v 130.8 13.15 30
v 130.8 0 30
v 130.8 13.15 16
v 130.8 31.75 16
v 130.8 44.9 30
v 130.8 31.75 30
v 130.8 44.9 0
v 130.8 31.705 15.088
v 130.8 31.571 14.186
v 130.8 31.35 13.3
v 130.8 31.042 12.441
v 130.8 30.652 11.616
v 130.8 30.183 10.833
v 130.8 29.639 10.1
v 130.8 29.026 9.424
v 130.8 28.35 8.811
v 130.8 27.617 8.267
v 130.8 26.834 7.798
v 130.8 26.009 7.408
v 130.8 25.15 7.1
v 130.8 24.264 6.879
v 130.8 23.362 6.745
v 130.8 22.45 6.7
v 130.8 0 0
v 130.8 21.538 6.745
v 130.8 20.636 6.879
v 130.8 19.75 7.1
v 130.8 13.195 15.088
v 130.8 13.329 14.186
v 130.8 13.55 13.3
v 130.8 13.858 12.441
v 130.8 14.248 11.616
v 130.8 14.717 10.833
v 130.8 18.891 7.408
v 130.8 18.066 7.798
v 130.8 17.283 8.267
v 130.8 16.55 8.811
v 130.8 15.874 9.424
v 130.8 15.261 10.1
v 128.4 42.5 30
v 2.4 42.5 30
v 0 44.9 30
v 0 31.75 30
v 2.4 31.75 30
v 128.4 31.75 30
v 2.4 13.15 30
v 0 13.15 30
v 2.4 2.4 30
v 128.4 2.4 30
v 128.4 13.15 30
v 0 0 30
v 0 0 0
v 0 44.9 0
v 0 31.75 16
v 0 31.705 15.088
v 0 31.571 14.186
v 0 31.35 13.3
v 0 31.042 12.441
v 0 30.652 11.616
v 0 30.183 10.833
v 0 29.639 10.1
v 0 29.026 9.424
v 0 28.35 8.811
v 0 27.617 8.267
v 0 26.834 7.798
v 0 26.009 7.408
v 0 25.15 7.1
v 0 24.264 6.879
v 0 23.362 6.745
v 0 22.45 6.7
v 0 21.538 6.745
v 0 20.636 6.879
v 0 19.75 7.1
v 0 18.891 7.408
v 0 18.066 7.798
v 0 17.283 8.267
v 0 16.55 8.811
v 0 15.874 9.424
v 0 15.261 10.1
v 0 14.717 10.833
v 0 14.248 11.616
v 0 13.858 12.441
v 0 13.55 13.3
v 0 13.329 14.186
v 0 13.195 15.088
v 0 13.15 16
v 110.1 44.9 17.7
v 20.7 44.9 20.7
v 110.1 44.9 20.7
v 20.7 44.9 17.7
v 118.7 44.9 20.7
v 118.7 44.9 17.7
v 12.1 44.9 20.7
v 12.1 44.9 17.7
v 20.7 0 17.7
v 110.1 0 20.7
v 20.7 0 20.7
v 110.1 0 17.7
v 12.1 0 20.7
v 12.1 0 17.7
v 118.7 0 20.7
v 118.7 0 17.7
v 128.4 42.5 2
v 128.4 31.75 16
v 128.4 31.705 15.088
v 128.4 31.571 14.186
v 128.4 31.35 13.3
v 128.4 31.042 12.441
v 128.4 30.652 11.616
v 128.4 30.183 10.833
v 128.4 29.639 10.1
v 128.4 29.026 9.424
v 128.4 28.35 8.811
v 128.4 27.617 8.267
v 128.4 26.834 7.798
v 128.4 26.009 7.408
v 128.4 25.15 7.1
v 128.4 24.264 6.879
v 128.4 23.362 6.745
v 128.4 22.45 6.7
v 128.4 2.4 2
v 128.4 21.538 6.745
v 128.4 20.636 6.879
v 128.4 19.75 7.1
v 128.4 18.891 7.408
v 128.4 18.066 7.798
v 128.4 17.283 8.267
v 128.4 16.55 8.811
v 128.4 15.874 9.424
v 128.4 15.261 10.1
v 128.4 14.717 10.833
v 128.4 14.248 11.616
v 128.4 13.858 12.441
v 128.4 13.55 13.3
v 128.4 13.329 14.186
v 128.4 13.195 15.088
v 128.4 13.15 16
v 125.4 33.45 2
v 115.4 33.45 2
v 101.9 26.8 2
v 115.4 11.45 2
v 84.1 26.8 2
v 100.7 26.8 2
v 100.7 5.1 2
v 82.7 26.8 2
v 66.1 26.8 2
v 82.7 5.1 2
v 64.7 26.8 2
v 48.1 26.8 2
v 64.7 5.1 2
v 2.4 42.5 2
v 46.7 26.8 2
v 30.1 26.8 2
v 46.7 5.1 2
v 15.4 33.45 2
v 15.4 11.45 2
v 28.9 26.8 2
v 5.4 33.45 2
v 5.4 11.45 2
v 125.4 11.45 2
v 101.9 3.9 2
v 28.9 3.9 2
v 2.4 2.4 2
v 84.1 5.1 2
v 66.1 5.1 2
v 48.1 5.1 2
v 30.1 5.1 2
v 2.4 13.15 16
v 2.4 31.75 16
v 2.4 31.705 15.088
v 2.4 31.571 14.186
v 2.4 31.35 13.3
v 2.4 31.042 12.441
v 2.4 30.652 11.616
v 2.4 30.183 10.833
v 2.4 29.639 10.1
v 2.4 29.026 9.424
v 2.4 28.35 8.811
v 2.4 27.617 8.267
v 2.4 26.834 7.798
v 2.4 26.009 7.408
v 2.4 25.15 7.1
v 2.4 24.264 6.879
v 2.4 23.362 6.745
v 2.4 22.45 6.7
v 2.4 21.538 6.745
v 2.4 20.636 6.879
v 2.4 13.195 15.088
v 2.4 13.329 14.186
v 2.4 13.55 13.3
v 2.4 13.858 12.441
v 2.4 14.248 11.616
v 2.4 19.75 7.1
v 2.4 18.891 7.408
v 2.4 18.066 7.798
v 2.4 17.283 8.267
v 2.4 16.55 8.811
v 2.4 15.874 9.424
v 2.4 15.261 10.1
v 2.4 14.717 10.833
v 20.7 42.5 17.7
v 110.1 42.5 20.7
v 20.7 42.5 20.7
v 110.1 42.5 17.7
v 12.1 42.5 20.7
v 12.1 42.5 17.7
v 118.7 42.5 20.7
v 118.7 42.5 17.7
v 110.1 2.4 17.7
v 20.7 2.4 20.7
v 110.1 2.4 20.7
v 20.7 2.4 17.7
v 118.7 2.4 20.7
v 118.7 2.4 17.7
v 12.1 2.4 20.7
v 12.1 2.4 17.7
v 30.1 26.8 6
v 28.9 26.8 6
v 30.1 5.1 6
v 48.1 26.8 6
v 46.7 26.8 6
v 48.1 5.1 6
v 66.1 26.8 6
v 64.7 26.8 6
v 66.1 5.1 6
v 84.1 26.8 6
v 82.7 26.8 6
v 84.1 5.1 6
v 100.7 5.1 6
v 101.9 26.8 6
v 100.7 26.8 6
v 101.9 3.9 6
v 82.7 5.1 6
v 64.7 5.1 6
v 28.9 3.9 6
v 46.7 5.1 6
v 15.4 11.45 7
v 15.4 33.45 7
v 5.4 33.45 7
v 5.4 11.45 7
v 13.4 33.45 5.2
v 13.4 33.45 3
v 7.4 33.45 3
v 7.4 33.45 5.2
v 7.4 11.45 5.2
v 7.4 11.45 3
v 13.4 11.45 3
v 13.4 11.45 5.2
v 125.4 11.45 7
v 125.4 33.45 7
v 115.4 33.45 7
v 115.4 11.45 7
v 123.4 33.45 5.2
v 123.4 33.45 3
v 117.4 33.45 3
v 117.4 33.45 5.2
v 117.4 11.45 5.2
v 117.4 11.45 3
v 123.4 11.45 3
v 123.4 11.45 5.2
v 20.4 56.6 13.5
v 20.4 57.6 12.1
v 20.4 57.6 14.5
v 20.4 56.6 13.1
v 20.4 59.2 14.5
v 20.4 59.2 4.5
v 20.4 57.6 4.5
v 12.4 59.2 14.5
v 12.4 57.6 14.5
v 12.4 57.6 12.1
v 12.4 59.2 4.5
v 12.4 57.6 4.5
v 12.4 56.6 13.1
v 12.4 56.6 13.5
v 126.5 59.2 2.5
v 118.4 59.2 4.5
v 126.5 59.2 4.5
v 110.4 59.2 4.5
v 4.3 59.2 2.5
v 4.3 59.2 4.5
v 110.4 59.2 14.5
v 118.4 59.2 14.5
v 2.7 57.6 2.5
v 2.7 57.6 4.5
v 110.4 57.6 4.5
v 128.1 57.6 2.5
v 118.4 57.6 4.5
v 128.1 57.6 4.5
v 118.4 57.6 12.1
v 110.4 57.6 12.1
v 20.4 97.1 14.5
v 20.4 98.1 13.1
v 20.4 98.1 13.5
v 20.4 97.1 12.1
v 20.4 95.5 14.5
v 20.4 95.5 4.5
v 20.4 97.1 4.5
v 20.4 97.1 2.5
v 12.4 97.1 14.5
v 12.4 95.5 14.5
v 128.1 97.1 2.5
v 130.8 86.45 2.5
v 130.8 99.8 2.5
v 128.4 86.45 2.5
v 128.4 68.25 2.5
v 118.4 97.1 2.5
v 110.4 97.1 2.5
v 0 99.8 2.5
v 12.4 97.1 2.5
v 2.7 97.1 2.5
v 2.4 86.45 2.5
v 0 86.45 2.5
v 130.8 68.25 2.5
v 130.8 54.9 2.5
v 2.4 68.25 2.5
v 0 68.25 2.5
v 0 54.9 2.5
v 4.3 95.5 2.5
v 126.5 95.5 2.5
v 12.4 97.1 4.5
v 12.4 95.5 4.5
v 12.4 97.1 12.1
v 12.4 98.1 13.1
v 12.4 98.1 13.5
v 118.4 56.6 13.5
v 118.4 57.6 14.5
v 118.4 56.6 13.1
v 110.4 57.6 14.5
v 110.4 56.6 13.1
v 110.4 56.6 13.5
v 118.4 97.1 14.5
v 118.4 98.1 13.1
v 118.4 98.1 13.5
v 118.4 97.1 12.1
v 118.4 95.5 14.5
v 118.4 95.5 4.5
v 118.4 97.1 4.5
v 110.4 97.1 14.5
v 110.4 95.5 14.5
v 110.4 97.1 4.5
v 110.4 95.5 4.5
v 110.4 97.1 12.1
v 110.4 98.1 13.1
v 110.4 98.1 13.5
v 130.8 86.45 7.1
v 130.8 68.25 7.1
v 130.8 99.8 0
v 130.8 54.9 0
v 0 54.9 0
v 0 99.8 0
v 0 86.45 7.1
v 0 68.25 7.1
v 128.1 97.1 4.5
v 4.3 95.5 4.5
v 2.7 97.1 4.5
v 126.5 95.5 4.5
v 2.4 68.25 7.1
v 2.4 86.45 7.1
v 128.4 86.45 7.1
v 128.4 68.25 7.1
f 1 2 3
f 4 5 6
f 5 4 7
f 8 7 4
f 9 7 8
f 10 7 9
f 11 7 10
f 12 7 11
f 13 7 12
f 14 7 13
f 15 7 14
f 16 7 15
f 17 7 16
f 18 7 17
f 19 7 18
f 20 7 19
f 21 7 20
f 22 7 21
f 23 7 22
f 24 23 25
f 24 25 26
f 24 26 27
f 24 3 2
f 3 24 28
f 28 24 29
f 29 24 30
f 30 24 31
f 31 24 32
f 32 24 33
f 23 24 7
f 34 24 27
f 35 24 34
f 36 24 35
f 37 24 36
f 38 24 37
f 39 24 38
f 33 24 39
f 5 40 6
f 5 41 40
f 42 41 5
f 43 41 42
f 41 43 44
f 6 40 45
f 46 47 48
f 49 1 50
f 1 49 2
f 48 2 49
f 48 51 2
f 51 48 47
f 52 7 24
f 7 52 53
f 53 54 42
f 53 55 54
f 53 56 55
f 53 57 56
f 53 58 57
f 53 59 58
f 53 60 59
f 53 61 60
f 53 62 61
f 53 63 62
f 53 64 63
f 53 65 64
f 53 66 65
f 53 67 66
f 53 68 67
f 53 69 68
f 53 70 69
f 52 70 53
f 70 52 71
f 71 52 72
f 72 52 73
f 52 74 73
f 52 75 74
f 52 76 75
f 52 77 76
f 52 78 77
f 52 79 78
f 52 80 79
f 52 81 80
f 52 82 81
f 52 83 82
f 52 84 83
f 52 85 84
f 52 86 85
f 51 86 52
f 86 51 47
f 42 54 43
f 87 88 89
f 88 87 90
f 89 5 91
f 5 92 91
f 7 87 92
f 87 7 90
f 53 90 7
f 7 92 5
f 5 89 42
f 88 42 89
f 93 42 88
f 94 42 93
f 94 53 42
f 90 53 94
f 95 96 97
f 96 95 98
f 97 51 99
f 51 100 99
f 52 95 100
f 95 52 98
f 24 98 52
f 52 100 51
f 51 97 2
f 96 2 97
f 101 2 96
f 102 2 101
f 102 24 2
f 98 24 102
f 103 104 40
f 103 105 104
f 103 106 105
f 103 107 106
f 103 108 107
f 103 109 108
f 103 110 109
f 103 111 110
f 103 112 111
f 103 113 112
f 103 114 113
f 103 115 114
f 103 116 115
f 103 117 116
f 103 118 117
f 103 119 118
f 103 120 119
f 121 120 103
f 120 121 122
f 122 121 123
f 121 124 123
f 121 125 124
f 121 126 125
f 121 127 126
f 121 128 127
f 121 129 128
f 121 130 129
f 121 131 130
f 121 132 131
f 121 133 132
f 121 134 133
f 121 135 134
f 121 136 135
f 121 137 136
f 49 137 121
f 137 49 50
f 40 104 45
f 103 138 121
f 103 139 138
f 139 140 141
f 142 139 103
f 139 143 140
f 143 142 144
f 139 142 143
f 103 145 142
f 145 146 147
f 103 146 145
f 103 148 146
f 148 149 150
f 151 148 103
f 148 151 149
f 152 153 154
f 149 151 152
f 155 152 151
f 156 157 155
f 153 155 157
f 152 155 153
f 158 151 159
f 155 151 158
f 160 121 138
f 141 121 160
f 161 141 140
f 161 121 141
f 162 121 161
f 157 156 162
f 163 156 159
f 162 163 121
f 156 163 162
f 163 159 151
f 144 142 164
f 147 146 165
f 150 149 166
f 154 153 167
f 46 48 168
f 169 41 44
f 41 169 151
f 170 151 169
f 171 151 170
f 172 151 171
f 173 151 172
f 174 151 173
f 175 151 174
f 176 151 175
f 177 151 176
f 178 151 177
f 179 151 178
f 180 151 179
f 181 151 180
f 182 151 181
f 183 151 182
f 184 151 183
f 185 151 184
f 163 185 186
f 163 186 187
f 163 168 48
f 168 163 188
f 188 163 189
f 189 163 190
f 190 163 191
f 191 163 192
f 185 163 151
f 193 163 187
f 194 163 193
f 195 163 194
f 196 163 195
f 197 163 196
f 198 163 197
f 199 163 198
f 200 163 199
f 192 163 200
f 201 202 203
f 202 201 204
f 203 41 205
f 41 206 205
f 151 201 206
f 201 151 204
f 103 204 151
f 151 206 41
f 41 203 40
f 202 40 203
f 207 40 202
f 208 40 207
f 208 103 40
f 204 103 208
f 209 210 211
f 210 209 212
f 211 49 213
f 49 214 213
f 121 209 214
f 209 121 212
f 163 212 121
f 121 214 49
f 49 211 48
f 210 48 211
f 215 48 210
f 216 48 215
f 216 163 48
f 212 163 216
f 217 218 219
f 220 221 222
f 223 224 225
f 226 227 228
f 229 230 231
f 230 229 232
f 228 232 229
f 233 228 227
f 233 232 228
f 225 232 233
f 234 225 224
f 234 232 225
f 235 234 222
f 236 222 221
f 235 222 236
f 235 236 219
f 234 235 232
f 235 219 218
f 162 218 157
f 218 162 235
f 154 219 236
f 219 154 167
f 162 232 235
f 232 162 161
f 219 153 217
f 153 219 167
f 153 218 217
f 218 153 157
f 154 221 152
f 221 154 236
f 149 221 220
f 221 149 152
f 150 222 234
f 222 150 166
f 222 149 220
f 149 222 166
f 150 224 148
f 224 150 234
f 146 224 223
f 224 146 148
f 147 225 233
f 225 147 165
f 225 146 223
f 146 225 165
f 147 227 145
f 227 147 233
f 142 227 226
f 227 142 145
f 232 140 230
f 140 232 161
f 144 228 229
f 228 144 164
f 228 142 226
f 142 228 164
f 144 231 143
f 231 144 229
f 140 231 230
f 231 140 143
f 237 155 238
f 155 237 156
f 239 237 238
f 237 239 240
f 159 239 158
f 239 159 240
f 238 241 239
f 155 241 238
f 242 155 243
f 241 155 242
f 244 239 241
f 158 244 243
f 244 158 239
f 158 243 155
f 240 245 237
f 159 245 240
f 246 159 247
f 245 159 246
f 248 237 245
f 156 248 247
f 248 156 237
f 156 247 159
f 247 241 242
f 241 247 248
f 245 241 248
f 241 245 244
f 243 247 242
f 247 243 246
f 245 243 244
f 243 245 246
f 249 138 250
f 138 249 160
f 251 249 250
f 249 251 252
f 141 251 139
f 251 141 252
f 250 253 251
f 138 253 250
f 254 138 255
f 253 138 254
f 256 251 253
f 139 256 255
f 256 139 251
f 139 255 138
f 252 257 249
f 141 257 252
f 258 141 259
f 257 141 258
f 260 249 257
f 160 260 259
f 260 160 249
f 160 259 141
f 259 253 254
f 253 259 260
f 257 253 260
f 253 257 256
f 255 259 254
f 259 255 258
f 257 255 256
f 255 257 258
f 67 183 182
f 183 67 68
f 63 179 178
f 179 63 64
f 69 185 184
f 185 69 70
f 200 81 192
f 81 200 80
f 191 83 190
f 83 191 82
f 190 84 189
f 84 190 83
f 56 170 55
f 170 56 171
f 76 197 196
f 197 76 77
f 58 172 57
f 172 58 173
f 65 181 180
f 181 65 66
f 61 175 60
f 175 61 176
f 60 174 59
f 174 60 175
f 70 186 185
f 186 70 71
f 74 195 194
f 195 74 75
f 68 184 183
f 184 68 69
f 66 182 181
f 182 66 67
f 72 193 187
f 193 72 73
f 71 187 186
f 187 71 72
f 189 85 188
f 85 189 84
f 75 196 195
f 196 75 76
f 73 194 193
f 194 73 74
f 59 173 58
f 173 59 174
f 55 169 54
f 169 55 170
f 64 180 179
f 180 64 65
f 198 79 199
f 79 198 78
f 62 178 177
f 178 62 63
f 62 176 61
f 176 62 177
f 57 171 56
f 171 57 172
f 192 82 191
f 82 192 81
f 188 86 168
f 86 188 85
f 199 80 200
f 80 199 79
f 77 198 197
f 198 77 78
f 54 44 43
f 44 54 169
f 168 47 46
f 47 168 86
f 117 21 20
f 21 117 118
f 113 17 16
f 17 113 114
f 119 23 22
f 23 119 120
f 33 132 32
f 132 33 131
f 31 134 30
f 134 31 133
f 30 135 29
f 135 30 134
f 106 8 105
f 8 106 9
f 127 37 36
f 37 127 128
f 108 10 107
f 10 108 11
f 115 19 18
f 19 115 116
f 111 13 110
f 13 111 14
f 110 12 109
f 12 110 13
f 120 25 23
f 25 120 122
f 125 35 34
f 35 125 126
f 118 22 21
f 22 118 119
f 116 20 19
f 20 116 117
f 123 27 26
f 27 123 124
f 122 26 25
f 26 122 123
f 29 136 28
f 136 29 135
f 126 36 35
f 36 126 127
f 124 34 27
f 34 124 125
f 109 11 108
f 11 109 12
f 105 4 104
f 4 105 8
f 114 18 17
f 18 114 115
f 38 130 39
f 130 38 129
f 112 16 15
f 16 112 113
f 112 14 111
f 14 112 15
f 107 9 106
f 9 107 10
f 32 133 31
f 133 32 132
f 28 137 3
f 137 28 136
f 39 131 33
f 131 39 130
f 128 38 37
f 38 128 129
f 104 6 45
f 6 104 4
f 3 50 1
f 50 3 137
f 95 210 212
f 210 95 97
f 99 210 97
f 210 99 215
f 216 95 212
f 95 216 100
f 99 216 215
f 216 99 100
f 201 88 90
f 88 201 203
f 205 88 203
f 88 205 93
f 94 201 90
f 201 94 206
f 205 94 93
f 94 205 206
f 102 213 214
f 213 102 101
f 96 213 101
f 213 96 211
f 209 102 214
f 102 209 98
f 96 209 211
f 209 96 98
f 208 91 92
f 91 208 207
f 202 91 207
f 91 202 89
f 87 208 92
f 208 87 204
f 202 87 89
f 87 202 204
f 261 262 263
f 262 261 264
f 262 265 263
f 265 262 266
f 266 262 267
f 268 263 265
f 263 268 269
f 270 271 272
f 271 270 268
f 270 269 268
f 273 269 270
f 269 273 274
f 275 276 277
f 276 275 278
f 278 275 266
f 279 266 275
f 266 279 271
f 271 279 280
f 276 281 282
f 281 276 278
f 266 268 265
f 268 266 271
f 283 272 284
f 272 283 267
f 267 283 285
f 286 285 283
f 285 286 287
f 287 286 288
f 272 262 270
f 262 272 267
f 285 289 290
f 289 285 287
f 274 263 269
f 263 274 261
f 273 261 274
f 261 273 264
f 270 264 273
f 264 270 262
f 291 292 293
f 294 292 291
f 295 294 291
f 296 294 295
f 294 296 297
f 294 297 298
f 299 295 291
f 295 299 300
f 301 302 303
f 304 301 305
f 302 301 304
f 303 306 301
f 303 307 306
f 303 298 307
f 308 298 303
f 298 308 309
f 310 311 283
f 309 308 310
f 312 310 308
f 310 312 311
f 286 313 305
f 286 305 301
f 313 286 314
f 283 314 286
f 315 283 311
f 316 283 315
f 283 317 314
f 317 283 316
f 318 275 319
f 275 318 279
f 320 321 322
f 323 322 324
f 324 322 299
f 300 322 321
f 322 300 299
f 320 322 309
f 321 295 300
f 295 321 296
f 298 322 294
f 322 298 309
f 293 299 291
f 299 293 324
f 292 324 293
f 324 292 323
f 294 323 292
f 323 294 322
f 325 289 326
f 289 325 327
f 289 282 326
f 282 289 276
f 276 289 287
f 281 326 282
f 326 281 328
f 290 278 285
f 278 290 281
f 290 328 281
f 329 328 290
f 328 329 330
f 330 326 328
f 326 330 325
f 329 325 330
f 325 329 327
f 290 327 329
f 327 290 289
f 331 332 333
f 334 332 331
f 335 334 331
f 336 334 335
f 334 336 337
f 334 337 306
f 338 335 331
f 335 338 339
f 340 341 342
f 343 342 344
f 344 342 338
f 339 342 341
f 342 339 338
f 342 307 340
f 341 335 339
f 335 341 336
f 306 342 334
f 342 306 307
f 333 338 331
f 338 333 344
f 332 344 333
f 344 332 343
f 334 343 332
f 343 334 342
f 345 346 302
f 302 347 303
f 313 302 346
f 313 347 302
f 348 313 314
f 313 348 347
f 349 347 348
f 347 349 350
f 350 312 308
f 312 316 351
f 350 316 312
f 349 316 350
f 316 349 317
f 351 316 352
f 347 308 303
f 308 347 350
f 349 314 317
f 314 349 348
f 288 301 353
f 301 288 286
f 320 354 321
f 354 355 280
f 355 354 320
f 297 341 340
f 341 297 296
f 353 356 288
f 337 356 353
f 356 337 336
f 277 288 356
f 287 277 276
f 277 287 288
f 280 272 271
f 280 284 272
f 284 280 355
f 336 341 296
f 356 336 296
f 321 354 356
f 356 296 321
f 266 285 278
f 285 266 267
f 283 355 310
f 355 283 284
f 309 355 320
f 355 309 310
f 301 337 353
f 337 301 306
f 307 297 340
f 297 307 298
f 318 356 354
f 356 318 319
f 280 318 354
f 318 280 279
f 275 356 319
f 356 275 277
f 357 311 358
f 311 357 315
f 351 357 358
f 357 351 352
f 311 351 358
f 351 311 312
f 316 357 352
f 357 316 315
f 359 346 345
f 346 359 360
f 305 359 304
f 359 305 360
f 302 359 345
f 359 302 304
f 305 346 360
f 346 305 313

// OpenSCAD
// =====================================================================
//  Inline junction box for rejoining a cut 10 AWG x 4C cord
//  with 4x WAGO 221-612 lever nuts  —  FIRST DRAFT (WAGOs only)
//
//  Units: mm.  Print base + lid.  PETG or ASA/ABS — NOT PLA.
//  Lid fastening: fastening = "snap" (cantilever hooks into wall windows,
//  press the barbs in from outside to release) or "screws" (4x M3 bosses).
//  Set  part = "base" / "lid" / "both"  then F6 + export STL.
//
//  BEFORE PRINTING: measure your cord OD with calipers and set cord_od.
//  10/4 STW is usually 14.5–18 mm; this file is set to 18.0 (measured).
// =====================================================================

/* [Cord] */
cord_od     = 18.0;   // measured with calipers (10/4 STW, 5 mm conductors)
cord_clear  = 0.6;    // extra on slot width

/* [WAGO 221-612 (datasheet: 16 W x 21.1 D x 10.1 H)] */
wago_w   = 16.0;   // across the two ports (X)
wago_d   = 21.1;   // along wire axis (Y)
wago_h   = 10.1;
wago_n   = 4;
wago_gap = 2.0;
wago_fit = 0.3;    // per-side pocket clearance
fence_h  = 4.0;
fence_t  = 1.2;

/* [Box] */
wall      = 2.4;
floor_t   = 2.0;
inner_h   = 28;    // interior height (>= cord_od + saddle_h + ~5 so the lid tab stays > 2 mm)
lid_t     = 2.5;
lip_t     = 1.6;
lip_h     = 2.0;
lip_clear = 0.3;
end_zone  = 28;    // room at each end for saddle + wire fan-out
front_ch  = 16;    // wire channel in front of WAGO entry faces
back_gap  = 3;

/* [Strain relief — zip-tie saddle] */
saddle_h = 5;
saddle_x = 10;
tie_w    = 6;      // zip-tie tunnel width
tie_h    = 2.2;    // zip-tie tunnel height
tie_z    = 1.0;    // tunnel floor above saddle base

/* [Fastening] */
fastening = "snap"; // ["snap","screws"]

/* [Snap-fit (PETG-sized)] */
snap_n    = 2;     // hooks per long side
snap_w    = 8;     // hook width (X)
snap_edge = 14;    // hook centre distance from each end wall
arm_len   = 12;    // arm length below lid underside (longer = softer snap)
barb_d    = 1.0;   // barb protrusion into the wall window
barb_h    = 2.4;   // barb height (45 deg chamfers top and bottom for printing)
win_clear = 0.3;   // window clearance around the barb, per side

/* [Screws] */
boss_d    = 7;
boss_hole = 2.6;   // 2.6 = M3 self-tap in PETG ; 4.0 = M3 heat-set insert
lid_hole  = 3.4;
boss_inset = 0.5;  // boss overlaps into the wall (avoids a tangent, non-manifold edge)

/* [Output] */
part = "both"; // ["base","lid","both"]

// ---------------- derived ----------------
row_len = wago_n*wago_w + (wago_n-1)*wago_gap;
inner_x = 2*end_zone + row_len;
inner_y = back_gap + wago_d + front_ch;
outer_x = inner_x + 2*wall;
outer_y = inner_y + 2*wall;
rim_z   = floor_t + inner_h;
slot_w  = cord_od + cord_clear;
cord_y  = wall + inner_y/2;
cord_zb = floor_t + saddle_h;          // cord bottom
cord_zc = cord_zb + cord_od/2;         // cord centre
cord_zt = cord_zb + cord_od;           // cord top
tab_w   = slot_w - 0.4;
tab_h   = rim_z - (cord_zt + 0.4);
boss_c  = wall + boss_d/2 - boss_inset;
snap    = (fastening == "snap");
lip_bo  = snap ? 0 : boss_d + lip_clear;   // lip notch clear of bosses (none when snapping)
snap_xs = [for (i=[0:snap_n-1]) wall + snap_edge + i*(outer_x - 2*(wall+snap_edge))/max(snap_n-1,1)];
$fn = 64;

module boss_positions() {
    for (x=[boss_c, outer_x-boss_c], y=[boss_c, outer_y-boss_c])
        translate([x,y,0]) children();
}

module cord_slot() {                    // U-slot, open to the top
    translate([-1, cord_y, cord_zc]) rotate([0,90,0]) cylinder(d=slot_w, h=wall+2);
    translate([-1, cord_y-slot_w/2, cord_zc]) cube([wall+2, slot_w, rim_z]);
}

module saddle(x0) {
    // block with a Y-axis tunnel under the deck for a zip tie
    sw = cord_od + 4;
    translate([x0, cord_y - sw/2, floor_t]) difference() {
        cube([saddle_x, sw, saddle_h]);
        translate([(saddle_x-tie_w)/2, -1, tie_z]) cube([tie_w, sw+2, tie_h]);
    }
}

module base() {
    difference() {
        union() {
            // shell
            difference() {
                cube([outer_x, outer_y, rim_z]);
                translate([wall, wall, floor_t]) cube([inner_x, inner_y, inner_h+1]);
            }
            // corner bosses (screw variant only)
            if (!snap) boss_positions() cylinder(d=boss_d, h=rim_z);
            // WAGO fences (open toward +Y front channel)
            for (i=[0:wago_n-1]) {
                x0 = wall + end_zone + i*(wago_w+wago_gap) - wago_fit;
                y0 = wall + back_gap - wago_fit;
                pw = wago_w + 2*wago_fit;
                pd = wago_d + 2*wago_fit;
                translate([x0-fence_t, y0-fence_t, floor_t]) cube([pw+2*fence_t, fence_t, fence_h]);
                translate([x0-fence_t, y0-fence_t, floor_t]) cube([fence_t, pd+fence_t, fence_h]);
                translate([x0+pw,      y0-fence_t, floor_t]) cube([fence_t, pd+fence_t, fence_h]);
            }
            // zip-tie saddles
            saddle(wall + 3);
            saddle(outer_x - wall - 3 - saddle_x);
        }
        // cord entries
        cord_slot();
        translate([outer_x - wall, 0, 0]) cord_slot();
        // screw holes
        if (!snap) boss_positions() translate([0,0,rim_z-14]) cylinder(d=boss_hole, h=20);
        // snap windows through both long walls
        if (snap) snap_windows();
    }
}

module snap_windows() {
    ww = snap_w + 2*win_clear;
    wh = barb_h + 2*win_clear;
    z0 = rim_z - arm_len - win_clear;       // barb occupies the bottom barb_h of the arm
    for (x=snap_xs, y=[-1, outer_y - wall - 1])
        translate([x - ww/2, y, z0]) cube([ww, wall+2, wh]);
}

// One hook, lid print orientation, on the y=0 side; barb points toward -Y (into the wall).
module snap_hook() {
    li = wall + lip_clear;
    zt = lid_t + arm_len;
    translate([-snap_w/2, 0, 0]) {
        translate([0, li, lid_t]) cube([snap_w, lip_t, arm_len]);
        // barb: 45 deg catch face underneath (printable), 45 deg lead-in on top
        translate([0, 0, 0]) rotate([90,0,90]) linear_extrude(snap_w)
            polygon([[li, zt - barb_h], [li - barb_d, zt - barb_h + barb_d],
                     [li - barb_d, zt - barb_d], [li, zt], [li + 0.01, zt], [li + 0.01, zt - barb_h]]);
    }
}

module lid() {   // modelled in PRINT orientation: plate on bed, lip/tabs up
    difference() {
        union() {
            cube([outer_x, outer_y, lid_t]);
            // alignment lip (4 bars, notched clear of the bosses)
            li = wall + lip_clear;  bo = lip_bo;
            translate([li+bo, li, lid_t])                       cube([outer_x-2*(li+bo), lip_t, lip_h]);
            translate([li+bo, outer_y-li-lip_t, lid_t])         cube([outer_x-2*(li+bo), lip_t, lip_h]);
            translate([li, li+bo, lid_t])                       cube([lip_t, outer_y-2*(li+bo), lip_h]);
            translate([outer_x-li-lip_t, li+bo, lid_t])         cube([lip_t, outer_y-2*(li+bo), lip_h]);
            // tabs that drop into the cord slots and sit just above the cord
            translate([0,          cord_y-tab_w/2, lid_t]) cube([wall, tab_w, tab_h]);
            translate([outer_x-wall, cord_y-tab_w/2, lid_t]) cube([wall, tab_w, tab_h]);
            // snap hooks on both long sides
            if (snap) for (x=snap_xs) {
                translate([x, 0, 0]) snap_hook();
                translate([x, outer_y, 0]) mirror([0,1,0]) snap_hook();
            }
        }
        if (!snap) boss_positions() translate([0,0,-1]) cylinder(d=lid_hole, h=lid_t+2);
    }
}

if (part == "base" || part == "both") base();
if (part == "lid"  || part == "both") translate([0, outer_y + 10, 0]) lid();

echo(str("Outer footprint: ", outer_x, " x ", outer_y, " mm; base height ", rim_z, " mm; lid ", lid_t + max(lip_h, tab_h, snap ? arm_len : 0), " mm; fastening ", fastening));
